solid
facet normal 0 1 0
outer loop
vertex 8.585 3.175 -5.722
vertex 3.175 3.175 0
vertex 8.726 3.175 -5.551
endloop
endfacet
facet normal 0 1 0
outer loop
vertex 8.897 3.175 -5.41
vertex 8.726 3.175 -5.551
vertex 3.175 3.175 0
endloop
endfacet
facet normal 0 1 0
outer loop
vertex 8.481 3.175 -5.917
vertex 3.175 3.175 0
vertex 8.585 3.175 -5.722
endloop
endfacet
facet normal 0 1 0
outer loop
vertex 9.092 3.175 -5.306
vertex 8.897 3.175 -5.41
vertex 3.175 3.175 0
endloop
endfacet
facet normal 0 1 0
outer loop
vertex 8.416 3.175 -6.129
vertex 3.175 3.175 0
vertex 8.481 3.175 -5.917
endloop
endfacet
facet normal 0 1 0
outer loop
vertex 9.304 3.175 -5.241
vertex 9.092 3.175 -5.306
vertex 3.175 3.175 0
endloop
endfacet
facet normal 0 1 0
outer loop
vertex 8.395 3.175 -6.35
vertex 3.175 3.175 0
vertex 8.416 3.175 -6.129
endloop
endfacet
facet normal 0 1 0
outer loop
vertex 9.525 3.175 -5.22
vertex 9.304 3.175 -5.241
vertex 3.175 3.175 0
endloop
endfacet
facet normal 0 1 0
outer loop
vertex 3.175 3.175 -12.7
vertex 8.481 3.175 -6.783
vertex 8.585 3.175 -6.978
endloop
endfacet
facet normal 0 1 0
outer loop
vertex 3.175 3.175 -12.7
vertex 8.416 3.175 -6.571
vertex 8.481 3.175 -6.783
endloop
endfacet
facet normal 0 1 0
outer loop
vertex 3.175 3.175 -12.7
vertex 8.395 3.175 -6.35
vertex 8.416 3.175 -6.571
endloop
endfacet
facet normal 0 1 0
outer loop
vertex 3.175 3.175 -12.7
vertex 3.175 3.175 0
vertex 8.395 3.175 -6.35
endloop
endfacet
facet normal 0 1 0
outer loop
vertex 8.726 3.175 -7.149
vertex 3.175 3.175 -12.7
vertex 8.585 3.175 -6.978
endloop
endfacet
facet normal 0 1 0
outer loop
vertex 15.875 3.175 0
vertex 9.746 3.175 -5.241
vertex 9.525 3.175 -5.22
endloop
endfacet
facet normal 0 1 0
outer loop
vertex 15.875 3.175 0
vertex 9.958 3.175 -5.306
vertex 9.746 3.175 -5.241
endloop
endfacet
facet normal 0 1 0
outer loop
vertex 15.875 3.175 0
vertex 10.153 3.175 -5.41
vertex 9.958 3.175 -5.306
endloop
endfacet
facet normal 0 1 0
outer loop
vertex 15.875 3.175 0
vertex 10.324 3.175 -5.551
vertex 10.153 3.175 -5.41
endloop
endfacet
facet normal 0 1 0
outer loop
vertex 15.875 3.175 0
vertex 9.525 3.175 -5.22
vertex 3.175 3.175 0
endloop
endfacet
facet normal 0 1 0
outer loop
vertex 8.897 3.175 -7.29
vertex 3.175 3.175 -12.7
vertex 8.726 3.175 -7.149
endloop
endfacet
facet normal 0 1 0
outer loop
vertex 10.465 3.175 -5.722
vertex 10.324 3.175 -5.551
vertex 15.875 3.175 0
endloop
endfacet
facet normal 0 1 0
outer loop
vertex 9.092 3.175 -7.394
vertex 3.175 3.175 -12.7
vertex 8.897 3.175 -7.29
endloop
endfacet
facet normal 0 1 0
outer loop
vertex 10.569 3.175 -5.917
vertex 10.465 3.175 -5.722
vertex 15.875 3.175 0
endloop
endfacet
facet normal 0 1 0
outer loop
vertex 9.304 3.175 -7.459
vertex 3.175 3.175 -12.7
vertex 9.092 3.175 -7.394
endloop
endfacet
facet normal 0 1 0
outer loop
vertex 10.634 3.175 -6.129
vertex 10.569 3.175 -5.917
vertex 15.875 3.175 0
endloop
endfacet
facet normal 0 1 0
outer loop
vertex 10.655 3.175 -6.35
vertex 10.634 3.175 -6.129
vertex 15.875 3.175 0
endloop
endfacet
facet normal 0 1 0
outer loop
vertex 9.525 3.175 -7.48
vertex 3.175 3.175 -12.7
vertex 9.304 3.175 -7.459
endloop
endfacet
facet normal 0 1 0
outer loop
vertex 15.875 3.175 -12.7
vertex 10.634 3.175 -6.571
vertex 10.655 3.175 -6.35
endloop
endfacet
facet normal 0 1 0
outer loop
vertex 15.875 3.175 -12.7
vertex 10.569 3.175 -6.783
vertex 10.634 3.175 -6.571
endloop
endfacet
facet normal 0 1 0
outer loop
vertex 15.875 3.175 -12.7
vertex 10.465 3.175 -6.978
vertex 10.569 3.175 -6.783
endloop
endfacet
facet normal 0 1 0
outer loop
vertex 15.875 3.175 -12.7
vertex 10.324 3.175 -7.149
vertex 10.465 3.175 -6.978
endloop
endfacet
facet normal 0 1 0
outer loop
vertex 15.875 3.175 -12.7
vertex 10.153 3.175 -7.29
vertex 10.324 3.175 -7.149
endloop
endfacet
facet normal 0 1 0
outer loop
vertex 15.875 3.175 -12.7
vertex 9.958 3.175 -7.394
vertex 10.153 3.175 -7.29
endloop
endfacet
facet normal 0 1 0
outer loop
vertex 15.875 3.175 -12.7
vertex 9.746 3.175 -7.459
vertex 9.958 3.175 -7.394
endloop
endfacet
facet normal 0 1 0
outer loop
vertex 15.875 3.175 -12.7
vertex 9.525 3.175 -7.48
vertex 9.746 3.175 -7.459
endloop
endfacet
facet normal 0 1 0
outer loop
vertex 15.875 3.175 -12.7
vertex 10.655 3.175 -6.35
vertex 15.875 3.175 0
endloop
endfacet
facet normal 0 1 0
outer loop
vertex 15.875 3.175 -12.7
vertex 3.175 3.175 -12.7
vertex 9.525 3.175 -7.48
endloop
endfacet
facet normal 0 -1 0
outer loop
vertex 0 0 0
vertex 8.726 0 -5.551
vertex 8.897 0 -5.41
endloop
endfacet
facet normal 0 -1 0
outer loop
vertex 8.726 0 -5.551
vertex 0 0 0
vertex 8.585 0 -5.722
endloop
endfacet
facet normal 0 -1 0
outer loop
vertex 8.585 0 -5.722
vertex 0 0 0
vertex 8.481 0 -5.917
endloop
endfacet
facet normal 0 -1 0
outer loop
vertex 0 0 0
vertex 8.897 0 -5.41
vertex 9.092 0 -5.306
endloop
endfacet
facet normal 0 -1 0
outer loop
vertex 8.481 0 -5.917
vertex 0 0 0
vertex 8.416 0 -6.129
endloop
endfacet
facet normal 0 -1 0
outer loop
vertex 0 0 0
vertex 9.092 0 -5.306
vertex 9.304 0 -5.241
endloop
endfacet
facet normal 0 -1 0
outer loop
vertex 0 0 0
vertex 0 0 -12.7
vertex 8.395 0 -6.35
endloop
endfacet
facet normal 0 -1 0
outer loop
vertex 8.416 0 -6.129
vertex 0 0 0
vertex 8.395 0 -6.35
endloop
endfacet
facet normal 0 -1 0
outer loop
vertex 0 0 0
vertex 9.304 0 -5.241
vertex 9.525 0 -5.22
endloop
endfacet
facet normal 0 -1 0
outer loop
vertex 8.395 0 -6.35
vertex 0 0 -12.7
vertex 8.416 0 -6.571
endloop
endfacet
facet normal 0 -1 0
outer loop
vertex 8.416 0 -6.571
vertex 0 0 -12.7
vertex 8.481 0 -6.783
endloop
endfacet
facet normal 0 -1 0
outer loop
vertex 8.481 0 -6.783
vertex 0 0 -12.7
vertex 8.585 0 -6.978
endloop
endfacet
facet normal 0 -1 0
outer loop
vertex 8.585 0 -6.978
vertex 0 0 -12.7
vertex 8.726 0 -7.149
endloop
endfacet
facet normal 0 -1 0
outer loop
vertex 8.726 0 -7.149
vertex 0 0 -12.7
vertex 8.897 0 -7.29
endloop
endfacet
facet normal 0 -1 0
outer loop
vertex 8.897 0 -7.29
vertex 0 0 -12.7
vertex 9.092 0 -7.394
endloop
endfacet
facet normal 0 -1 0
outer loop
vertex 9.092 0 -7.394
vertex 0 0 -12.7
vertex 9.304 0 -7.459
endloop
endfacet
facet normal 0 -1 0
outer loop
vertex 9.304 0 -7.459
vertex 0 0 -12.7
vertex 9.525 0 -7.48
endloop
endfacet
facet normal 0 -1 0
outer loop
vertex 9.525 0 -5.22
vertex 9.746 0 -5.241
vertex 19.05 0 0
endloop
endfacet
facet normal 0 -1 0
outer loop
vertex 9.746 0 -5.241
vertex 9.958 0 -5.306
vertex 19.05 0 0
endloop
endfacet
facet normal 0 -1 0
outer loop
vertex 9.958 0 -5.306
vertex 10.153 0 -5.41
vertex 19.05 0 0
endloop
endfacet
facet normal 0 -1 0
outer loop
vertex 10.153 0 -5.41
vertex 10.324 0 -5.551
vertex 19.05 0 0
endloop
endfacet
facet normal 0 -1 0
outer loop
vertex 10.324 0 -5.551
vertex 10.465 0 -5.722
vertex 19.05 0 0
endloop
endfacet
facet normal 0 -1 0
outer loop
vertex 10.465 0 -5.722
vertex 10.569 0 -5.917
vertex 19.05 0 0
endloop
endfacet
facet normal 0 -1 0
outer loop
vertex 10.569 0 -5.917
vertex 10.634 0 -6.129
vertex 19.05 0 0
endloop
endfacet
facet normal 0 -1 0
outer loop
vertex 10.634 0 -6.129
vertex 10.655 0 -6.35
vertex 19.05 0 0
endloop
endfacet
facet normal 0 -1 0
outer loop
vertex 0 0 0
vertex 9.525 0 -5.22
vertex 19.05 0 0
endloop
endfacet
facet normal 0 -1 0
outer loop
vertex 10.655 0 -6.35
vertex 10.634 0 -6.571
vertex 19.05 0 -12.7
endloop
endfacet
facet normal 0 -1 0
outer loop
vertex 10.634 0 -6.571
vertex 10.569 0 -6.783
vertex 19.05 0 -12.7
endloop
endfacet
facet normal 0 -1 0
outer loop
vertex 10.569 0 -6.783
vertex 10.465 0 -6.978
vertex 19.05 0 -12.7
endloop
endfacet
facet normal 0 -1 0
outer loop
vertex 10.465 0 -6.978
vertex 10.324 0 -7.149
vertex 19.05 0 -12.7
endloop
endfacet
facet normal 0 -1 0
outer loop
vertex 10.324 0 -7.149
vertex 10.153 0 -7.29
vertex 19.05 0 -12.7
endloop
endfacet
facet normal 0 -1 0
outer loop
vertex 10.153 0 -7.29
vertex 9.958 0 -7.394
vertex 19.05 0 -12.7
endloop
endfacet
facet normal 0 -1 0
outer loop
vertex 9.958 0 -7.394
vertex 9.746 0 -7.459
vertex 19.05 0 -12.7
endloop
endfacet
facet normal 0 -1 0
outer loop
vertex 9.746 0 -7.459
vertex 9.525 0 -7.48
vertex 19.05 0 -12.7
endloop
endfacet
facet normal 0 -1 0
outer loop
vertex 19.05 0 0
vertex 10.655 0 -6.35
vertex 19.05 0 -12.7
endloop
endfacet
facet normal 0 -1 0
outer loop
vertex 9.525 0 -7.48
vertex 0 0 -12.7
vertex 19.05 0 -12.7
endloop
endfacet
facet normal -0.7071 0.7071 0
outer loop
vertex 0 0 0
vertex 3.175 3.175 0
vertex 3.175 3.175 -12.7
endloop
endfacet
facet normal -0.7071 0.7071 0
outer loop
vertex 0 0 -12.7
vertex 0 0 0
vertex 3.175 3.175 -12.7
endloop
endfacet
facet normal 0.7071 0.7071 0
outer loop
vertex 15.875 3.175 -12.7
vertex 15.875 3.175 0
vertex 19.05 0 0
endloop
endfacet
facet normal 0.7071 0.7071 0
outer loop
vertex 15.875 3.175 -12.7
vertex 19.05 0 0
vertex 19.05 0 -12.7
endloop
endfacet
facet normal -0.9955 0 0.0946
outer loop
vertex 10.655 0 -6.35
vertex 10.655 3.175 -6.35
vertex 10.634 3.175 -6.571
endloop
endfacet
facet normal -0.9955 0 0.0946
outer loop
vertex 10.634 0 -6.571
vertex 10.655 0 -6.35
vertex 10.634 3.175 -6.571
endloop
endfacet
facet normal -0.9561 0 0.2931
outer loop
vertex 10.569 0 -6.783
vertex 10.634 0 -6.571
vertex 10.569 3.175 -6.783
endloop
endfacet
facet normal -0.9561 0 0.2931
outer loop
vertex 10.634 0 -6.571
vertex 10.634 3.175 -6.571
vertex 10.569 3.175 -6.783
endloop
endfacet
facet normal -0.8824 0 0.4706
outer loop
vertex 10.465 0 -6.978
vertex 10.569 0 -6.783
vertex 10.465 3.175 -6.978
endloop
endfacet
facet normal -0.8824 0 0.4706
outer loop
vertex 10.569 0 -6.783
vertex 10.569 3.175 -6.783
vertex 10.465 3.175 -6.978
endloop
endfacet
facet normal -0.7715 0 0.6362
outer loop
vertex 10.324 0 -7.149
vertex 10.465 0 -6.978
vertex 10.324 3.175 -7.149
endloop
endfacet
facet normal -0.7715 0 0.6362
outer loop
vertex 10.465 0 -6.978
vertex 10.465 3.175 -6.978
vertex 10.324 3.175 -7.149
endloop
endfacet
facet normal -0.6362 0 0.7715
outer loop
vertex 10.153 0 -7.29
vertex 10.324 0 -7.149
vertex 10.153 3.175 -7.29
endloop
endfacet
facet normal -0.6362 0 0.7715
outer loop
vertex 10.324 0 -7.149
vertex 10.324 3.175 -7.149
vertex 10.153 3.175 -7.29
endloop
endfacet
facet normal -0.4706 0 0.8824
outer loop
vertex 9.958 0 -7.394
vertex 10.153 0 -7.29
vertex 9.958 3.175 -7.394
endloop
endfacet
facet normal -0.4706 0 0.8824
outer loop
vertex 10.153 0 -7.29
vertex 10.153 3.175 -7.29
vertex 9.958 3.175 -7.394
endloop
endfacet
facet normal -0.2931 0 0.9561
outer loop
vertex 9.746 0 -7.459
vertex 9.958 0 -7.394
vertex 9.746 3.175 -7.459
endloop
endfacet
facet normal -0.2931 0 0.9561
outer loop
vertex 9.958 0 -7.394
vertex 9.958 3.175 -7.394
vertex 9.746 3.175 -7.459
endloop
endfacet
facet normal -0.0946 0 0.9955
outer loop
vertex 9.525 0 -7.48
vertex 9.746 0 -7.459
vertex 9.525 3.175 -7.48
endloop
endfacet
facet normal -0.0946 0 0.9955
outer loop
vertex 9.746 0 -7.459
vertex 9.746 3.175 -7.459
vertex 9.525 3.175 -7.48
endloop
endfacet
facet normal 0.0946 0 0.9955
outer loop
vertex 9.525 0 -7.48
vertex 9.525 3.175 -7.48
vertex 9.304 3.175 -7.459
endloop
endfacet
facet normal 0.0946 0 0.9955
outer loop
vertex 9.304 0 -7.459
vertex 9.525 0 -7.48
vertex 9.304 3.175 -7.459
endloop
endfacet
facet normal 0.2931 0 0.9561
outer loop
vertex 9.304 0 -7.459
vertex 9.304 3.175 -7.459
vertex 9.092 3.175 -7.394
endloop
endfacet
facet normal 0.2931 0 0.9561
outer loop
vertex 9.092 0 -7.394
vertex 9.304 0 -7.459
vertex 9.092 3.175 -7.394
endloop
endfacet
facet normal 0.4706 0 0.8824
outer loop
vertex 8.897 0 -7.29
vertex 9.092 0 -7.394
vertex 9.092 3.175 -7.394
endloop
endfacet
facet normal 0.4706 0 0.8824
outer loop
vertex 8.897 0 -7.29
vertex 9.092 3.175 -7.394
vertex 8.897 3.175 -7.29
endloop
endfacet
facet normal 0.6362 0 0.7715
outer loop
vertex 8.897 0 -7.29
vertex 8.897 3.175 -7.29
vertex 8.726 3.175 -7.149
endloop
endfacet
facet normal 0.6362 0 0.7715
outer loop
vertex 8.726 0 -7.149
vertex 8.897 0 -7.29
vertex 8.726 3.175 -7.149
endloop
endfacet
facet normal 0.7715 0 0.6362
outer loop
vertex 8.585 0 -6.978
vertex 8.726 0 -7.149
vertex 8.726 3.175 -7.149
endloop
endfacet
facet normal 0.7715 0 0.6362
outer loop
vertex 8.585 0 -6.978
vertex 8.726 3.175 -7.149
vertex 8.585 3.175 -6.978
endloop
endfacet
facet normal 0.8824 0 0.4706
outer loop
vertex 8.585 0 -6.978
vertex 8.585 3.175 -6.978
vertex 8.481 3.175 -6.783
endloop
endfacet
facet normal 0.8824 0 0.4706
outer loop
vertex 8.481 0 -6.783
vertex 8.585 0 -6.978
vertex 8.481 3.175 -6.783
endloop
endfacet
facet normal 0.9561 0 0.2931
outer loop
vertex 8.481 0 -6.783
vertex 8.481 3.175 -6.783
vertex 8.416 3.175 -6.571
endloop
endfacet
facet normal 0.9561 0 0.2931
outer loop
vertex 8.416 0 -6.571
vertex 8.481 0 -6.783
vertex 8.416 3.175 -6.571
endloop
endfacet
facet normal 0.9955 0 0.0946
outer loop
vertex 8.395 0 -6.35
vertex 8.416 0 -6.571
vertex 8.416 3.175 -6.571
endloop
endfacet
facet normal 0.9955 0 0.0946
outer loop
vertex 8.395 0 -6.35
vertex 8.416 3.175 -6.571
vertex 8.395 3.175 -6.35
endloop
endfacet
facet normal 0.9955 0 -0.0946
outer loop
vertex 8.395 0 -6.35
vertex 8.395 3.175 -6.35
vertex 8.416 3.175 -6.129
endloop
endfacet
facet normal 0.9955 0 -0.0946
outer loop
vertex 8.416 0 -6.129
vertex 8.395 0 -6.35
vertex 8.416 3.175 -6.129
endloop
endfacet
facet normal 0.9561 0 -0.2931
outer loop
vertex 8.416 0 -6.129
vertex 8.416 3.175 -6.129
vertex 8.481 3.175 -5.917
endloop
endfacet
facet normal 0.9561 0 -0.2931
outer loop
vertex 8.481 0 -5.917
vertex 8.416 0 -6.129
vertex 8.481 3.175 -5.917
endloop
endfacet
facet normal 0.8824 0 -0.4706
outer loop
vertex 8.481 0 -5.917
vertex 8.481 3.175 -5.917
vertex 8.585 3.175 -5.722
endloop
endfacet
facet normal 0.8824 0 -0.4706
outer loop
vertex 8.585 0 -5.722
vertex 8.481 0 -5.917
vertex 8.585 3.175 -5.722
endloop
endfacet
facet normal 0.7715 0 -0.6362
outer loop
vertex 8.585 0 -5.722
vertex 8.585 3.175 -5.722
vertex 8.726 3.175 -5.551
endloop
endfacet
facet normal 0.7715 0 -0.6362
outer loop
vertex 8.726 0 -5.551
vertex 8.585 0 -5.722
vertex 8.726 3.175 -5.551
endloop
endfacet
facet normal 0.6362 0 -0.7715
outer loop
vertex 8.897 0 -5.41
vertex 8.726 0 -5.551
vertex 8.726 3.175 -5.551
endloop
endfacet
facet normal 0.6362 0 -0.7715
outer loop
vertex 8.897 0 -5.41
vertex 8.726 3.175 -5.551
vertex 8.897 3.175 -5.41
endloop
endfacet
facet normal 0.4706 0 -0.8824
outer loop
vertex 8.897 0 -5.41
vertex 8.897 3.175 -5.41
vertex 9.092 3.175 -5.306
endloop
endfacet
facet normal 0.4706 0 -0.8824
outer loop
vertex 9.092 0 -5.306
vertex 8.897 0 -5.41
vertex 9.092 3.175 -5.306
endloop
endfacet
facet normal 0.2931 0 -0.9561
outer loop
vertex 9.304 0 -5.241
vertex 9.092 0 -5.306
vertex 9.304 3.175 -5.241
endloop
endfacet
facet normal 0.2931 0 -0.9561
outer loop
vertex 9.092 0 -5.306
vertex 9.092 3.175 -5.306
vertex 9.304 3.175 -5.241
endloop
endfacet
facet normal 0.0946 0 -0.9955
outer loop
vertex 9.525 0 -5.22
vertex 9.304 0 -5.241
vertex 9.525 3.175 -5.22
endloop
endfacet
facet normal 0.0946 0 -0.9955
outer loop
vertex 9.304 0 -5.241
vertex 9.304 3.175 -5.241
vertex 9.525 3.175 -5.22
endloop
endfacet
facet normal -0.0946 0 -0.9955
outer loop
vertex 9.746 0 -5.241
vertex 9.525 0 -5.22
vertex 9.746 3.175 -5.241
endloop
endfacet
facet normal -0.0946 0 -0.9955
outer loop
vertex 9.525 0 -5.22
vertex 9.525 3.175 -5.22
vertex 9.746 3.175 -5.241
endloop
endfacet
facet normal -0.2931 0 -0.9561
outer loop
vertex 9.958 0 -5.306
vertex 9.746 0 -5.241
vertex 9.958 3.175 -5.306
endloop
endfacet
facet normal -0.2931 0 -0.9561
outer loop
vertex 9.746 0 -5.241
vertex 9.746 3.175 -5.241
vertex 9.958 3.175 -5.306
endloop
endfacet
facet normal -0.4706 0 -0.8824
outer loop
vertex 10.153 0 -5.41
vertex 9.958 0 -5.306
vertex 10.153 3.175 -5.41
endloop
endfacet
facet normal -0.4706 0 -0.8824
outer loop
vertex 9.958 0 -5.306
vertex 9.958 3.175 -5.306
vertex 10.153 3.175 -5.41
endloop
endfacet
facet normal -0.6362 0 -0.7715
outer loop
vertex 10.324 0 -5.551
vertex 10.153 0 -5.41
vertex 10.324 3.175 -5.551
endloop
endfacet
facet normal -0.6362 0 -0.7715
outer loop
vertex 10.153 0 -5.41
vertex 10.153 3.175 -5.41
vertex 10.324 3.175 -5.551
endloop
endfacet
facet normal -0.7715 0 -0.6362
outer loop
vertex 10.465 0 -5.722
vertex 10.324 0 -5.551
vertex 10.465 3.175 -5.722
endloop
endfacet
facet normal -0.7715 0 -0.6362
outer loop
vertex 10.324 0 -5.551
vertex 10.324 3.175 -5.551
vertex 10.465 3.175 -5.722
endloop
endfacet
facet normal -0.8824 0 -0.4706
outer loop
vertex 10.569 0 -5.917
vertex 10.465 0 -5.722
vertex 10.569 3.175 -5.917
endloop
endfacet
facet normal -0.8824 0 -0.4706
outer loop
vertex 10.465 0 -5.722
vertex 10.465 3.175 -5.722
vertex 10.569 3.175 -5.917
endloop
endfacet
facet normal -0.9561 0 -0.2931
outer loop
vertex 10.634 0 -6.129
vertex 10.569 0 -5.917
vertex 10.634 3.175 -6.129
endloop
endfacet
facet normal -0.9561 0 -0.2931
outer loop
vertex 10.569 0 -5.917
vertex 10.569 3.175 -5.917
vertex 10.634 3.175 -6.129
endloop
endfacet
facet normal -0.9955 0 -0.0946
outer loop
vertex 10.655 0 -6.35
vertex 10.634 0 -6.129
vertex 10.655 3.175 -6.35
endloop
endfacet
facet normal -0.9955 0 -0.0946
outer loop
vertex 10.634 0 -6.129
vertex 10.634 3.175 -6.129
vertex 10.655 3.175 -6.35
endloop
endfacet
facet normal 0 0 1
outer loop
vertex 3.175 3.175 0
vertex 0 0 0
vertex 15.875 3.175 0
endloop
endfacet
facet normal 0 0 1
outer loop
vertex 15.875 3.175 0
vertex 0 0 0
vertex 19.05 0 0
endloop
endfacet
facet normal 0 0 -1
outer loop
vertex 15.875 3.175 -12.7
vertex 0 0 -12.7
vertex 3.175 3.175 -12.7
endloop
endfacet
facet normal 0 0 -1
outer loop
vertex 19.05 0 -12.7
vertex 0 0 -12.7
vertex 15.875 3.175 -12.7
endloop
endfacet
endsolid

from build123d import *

# Parameters (mm, degrees)
SKETCH1_W                 = 19.05
SKETCH1_H                 = 12.7
BOSS_EXTRUDE1_DEPTH       = 3.175
CHAMFER1_SIZE             = 3.175
TAP_DRILL_FOR_4_40_TAP1_D = 2.2606


with BuildPart() as part:
    # Sketch1 → Boss-Extrude1 (new body)
    with BuildSketch(Plane(origin=(0, 0, 0), x_dir=(1, 0, 0), z_dir=(0, 1, 0))):
        with Locations((9.525, 6.35)):
            Rectangle(SKETCH1_W, SKETCH1_H)
    extrude(amount=BOSS_EXTRUDE1_DEPTH)

    # Chamfer1
    chamfer1_edges = [part.edges().sort_by_distance(p)[0] for p in [
        (19.05, 3.175, -6.35),
        (0, 3.175, -6.35),
    ]]
    chamfer(chamfer1_edges, length=CHAMFER1_SIZE - 0.0001)  # a hair under: the kernel refuses the full size

    # Tap Drill for #4-40 Tap1 (through all)
    with Locations(Plane(origin=(0, 0, 0), x_dir=(-1, 0, 0), z_dir=(0, -1, 0))):
        with Locations((-9.525, 6.35)):
            Hole(TAP_DRILL_FOR_4_40_TAP1_D / 2)


solid = part.part
